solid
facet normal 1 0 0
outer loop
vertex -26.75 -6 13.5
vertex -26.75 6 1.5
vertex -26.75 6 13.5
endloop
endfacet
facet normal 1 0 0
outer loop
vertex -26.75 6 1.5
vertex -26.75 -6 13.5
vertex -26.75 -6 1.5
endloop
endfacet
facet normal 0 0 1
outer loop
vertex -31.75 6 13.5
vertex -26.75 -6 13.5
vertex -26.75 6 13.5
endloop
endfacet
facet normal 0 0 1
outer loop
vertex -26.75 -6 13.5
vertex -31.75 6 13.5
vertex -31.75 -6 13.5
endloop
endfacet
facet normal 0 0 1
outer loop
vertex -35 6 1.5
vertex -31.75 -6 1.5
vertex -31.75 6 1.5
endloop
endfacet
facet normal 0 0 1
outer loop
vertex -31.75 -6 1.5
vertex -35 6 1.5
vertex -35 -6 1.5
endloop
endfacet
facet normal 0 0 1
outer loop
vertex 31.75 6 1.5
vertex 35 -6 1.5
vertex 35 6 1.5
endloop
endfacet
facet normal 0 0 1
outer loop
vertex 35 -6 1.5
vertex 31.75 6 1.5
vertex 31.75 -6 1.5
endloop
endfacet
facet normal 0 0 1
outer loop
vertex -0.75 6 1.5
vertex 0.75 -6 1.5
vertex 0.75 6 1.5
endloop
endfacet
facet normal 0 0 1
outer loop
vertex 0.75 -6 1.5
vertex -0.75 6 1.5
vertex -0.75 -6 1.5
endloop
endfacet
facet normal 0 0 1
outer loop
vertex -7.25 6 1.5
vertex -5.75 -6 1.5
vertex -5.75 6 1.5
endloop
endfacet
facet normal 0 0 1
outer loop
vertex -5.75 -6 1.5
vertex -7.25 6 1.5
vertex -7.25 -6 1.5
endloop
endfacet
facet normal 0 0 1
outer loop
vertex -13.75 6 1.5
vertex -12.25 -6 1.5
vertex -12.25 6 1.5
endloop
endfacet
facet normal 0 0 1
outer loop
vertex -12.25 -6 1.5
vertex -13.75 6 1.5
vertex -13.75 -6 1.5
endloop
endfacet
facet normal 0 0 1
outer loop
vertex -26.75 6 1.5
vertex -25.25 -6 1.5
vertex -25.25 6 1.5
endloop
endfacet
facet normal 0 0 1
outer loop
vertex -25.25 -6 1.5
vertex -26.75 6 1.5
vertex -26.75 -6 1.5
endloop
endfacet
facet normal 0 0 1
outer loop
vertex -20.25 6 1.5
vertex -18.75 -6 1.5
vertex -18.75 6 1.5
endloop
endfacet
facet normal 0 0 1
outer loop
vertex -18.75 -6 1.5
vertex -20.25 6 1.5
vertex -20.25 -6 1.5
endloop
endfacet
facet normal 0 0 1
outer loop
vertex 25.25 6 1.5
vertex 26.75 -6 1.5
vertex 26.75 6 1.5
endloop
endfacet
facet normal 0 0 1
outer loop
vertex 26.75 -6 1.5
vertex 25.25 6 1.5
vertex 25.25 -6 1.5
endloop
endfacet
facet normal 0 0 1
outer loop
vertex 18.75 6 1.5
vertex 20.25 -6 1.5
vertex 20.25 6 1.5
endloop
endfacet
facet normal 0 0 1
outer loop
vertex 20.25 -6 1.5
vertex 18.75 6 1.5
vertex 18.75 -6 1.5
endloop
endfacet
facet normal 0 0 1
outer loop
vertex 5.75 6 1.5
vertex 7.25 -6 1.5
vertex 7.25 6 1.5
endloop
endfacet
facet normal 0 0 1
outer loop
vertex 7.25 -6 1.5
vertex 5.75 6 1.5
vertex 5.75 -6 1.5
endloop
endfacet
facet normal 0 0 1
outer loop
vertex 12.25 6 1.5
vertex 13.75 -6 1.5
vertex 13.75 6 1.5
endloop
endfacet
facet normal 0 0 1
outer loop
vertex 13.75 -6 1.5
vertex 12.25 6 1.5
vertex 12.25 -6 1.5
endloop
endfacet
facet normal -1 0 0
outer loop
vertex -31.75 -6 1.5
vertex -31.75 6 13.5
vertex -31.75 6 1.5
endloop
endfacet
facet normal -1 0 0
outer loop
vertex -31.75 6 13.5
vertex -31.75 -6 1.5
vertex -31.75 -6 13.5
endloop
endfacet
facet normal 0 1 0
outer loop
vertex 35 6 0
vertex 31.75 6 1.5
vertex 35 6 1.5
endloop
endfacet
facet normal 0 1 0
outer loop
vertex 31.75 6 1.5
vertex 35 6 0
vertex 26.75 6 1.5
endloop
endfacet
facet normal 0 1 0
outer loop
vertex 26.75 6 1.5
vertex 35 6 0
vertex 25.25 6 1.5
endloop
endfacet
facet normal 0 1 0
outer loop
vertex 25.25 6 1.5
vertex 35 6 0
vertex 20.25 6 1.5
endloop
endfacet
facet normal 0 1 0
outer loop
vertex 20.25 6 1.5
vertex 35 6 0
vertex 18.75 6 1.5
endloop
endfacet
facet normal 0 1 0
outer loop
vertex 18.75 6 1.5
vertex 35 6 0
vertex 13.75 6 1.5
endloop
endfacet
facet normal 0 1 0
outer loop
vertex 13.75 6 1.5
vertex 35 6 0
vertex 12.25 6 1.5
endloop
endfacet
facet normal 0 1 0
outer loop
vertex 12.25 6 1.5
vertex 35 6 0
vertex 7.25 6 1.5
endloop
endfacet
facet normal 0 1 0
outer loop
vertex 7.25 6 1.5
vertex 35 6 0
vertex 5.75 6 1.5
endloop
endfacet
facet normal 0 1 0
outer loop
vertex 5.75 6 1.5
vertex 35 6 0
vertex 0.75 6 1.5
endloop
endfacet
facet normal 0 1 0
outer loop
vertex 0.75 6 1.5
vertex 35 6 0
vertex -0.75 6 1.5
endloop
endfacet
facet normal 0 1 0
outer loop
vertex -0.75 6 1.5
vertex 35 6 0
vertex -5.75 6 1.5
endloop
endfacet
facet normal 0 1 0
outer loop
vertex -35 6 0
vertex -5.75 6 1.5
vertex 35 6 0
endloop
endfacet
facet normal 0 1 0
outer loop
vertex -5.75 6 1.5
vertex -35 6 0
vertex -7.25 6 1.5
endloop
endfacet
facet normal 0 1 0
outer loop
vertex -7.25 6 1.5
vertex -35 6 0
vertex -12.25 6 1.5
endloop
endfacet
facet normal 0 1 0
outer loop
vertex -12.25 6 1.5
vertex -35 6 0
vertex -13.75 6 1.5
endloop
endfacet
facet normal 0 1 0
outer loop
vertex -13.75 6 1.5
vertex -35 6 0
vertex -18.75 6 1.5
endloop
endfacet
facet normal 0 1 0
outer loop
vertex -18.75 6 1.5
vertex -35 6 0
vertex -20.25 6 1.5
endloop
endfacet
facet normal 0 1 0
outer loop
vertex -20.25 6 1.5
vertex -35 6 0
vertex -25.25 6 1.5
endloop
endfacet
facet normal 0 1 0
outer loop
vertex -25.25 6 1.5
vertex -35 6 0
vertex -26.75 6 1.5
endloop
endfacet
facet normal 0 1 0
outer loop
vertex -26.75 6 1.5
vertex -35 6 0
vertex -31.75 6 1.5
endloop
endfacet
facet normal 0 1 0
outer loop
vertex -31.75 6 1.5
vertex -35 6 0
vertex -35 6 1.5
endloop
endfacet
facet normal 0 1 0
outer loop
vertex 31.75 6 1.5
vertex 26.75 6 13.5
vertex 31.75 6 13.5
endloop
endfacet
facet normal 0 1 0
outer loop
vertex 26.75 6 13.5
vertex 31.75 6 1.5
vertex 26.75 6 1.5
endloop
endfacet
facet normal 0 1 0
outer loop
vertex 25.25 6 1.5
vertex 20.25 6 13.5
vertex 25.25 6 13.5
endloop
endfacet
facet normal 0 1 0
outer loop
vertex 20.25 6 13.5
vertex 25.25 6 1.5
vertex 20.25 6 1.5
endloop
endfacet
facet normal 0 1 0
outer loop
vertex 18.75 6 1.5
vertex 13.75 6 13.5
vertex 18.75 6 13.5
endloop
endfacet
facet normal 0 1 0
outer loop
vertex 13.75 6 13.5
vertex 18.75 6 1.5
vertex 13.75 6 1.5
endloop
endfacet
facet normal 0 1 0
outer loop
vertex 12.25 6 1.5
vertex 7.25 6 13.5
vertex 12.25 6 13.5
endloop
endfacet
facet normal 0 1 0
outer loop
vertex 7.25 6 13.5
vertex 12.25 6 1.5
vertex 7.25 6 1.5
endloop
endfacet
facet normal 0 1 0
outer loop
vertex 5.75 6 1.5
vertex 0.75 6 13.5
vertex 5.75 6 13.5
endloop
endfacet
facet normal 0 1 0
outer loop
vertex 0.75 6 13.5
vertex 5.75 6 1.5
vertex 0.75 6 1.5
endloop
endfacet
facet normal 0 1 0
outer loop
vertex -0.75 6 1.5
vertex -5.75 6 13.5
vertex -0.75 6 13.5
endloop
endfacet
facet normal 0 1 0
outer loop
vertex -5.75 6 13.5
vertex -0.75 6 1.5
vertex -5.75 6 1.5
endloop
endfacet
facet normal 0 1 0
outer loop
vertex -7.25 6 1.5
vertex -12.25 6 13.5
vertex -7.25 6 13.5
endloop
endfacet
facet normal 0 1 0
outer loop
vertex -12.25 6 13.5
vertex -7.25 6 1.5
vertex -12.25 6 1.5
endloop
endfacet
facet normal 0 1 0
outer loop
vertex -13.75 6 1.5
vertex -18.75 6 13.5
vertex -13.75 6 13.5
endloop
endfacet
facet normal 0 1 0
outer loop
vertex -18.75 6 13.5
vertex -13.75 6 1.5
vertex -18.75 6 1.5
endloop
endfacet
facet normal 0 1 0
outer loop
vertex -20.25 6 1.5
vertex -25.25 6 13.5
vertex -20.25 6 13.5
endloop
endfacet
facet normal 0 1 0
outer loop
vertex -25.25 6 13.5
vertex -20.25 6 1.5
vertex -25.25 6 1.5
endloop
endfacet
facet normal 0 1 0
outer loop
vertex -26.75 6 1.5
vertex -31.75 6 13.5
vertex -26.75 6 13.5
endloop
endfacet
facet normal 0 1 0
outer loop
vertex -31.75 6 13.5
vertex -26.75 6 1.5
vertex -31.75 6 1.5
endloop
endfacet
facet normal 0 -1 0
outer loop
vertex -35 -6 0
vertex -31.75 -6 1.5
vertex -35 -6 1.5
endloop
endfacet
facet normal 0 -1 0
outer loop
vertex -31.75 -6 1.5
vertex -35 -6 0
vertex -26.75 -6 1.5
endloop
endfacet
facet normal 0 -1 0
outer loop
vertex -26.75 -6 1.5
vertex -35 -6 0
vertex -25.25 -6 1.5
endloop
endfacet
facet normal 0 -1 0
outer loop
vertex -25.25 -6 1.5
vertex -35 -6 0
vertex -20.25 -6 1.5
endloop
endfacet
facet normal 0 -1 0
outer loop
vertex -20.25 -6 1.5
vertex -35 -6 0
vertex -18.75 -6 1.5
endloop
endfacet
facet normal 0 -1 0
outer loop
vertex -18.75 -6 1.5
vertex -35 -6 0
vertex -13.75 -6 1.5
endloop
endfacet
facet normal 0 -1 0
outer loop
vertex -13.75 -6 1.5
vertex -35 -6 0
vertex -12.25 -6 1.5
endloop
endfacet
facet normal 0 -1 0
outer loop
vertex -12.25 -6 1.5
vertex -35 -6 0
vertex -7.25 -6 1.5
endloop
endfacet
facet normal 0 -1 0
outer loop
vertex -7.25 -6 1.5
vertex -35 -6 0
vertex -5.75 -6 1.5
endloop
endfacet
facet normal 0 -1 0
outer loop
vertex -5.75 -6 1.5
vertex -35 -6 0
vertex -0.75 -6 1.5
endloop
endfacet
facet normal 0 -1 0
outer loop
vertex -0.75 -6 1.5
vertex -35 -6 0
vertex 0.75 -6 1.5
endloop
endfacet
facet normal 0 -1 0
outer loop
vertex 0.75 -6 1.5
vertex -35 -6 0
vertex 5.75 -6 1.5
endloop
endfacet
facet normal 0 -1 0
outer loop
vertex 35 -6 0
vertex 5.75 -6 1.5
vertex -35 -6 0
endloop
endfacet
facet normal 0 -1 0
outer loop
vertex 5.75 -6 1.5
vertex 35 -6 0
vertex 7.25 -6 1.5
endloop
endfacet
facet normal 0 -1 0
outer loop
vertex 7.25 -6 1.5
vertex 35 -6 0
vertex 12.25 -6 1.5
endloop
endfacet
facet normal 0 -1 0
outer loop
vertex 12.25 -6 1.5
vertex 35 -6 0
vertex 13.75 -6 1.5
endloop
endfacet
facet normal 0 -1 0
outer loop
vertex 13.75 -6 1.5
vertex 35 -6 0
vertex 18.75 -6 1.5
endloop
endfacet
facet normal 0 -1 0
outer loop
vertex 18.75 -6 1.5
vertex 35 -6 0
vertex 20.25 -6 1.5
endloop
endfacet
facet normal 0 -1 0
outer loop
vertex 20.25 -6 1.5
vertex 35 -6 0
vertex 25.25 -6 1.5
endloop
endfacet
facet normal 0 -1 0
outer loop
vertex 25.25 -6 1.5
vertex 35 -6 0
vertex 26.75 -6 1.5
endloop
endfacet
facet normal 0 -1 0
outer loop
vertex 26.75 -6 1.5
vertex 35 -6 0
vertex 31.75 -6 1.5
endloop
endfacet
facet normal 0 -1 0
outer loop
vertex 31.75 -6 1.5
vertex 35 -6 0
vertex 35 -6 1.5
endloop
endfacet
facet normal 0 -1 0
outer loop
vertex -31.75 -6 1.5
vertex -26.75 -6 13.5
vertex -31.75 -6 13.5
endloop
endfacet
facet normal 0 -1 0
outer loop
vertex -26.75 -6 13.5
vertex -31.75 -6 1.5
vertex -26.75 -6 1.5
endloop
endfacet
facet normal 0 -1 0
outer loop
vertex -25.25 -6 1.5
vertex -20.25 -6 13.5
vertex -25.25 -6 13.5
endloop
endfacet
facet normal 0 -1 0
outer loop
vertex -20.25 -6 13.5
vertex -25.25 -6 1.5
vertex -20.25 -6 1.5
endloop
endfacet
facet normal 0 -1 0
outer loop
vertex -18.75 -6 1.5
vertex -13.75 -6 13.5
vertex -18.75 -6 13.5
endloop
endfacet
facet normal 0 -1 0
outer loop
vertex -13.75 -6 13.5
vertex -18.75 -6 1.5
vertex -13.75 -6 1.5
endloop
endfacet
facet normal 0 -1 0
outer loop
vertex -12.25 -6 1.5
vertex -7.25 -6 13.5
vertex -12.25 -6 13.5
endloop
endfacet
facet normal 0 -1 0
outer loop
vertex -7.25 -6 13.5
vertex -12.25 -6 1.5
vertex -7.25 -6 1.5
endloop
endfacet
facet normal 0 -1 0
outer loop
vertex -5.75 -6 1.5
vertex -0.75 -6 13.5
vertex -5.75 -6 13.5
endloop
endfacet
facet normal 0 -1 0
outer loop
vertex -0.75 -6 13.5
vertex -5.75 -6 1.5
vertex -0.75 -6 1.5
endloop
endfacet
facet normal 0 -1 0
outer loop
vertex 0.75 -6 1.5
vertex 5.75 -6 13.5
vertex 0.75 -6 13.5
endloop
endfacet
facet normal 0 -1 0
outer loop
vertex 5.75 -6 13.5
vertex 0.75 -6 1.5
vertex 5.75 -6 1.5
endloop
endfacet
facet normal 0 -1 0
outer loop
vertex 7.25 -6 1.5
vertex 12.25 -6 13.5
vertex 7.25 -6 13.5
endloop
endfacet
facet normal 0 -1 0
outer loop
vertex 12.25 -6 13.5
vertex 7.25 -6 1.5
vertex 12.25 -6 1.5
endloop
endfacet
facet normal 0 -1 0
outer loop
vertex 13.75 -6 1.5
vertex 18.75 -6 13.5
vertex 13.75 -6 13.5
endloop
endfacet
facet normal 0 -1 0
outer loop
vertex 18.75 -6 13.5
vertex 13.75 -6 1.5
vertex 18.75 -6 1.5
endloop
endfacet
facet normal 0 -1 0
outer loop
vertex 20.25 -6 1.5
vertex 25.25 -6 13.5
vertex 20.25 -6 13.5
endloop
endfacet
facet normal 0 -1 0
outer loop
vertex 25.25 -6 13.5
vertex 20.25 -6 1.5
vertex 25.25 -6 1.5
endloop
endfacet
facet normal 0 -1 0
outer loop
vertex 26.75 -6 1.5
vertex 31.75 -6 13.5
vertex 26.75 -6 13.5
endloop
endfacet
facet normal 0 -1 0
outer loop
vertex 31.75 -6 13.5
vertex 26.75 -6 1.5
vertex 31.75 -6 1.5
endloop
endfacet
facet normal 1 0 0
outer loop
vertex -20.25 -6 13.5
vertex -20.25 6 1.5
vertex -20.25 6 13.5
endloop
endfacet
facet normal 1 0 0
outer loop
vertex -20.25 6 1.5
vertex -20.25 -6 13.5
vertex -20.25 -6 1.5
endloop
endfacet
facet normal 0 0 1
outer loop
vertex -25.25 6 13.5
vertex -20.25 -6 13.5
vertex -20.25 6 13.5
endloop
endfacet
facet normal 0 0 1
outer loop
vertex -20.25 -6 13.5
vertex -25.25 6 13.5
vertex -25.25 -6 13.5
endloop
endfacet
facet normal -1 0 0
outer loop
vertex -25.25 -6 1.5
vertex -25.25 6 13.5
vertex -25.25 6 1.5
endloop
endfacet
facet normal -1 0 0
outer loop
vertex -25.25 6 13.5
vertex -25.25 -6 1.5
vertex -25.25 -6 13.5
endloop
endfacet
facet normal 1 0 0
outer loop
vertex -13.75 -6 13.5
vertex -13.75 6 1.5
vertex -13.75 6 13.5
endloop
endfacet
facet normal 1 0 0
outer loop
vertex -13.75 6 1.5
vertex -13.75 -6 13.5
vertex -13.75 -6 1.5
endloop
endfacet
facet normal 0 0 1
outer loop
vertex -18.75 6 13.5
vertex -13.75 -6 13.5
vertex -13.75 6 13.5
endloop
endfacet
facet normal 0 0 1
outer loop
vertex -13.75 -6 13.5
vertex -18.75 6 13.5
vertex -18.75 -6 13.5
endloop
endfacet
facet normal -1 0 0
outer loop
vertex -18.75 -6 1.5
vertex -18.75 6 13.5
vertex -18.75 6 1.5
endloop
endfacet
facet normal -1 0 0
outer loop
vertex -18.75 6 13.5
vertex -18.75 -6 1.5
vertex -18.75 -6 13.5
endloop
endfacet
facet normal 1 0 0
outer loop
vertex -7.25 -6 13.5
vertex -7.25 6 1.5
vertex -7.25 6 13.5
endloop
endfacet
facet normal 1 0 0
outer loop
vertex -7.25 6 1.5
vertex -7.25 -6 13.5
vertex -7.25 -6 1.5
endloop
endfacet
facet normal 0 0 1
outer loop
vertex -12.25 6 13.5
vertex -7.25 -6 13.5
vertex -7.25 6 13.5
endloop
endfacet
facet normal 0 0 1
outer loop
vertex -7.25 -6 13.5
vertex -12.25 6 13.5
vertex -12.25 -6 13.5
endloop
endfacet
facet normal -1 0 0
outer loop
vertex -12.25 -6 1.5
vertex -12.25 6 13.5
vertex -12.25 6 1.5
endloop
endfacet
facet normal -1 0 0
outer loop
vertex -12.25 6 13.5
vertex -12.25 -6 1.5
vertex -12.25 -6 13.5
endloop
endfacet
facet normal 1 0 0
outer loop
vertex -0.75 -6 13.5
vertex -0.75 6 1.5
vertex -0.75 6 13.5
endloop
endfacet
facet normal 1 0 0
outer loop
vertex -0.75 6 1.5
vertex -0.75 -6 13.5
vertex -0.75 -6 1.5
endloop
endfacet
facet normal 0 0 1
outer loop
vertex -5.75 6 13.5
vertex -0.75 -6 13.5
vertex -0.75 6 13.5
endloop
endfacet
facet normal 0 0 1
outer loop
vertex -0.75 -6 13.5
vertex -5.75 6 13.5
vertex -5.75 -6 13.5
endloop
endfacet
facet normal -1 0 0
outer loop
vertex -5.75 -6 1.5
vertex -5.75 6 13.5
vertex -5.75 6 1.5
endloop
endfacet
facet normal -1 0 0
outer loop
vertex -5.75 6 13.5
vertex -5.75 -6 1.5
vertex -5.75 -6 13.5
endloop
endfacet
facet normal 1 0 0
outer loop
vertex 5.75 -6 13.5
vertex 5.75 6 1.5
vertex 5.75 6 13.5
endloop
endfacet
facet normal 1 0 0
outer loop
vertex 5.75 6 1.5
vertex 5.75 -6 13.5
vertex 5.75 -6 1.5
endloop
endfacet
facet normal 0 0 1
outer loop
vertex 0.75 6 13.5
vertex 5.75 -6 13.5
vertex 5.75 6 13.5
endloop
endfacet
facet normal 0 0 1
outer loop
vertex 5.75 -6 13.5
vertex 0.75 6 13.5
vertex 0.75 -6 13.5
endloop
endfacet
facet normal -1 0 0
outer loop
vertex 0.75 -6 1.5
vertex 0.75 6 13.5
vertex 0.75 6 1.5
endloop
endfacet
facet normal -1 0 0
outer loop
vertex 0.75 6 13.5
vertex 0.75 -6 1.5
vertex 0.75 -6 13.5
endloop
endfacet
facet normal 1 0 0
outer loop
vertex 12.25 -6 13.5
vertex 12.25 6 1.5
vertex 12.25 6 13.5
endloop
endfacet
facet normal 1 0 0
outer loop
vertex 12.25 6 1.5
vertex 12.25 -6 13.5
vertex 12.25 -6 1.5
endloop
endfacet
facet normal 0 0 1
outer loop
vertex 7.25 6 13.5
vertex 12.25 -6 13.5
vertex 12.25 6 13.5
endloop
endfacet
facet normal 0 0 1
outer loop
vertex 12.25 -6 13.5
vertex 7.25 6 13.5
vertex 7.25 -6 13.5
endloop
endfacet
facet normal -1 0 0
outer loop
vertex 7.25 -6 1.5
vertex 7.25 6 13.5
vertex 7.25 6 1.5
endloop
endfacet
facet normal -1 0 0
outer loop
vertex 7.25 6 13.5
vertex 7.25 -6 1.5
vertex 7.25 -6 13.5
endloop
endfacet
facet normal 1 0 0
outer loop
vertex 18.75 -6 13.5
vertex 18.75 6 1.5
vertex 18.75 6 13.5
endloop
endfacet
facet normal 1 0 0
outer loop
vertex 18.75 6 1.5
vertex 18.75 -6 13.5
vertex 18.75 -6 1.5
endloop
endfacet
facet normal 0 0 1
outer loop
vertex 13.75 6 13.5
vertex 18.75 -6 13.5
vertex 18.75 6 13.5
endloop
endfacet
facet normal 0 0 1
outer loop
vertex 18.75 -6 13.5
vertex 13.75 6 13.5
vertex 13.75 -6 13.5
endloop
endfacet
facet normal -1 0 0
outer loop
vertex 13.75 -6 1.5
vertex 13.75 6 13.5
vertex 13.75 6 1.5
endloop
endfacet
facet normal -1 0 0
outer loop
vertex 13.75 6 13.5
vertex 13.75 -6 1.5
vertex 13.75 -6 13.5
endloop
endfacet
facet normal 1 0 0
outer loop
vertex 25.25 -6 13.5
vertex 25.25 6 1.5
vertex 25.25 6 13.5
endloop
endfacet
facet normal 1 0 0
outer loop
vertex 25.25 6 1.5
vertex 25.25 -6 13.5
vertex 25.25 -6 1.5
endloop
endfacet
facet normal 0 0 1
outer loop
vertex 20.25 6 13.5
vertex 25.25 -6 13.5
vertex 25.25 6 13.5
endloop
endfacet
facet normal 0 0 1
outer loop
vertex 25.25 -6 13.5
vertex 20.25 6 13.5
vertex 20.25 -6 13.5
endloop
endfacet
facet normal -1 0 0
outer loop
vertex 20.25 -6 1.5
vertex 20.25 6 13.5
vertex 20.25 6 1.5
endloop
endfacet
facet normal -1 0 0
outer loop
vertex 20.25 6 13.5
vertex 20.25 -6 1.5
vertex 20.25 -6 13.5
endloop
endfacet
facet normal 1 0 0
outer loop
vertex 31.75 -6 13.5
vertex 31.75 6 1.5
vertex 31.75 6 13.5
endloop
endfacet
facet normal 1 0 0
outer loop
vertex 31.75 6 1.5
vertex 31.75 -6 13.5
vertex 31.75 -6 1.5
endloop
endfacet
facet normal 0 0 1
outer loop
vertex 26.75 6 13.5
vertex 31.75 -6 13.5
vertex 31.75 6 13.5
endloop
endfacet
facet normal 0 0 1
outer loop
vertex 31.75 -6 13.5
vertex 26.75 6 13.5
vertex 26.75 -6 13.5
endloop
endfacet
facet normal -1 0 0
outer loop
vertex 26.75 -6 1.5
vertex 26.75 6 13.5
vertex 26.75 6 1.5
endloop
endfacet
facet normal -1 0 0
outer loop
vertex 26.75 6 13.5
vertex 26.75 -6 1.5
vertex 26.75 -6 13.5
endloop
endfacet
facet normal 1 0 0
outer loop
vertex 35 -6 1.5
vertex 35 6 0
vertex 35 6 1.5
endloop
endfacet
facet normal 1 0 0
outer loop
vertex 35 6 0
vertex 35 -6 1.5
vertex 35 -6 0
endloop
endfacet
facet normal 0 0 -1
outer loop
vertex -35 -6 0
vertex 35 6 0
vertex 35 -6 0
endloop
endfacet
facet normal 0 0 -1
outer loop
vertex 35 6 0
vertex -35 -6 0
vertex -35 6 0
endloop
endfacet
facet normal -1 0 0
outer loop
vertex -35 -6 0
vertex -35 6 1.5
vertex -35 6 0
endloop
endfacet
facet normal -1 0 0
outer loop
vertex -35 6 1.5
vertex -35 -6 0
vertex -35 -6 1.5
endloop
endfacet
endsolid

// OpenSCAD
// 10-well comb for casting agarose gels
// Print orientation: flat on bed, teeth pointing down (-Z)

// ---------- Parameters ----------
plate_t      = 1.5;   // plate thickness (Z)
spine_len    = 70;    // spine length (X)
spine_w      = 12;    // spine width (Y)
tooth_count  = 10;    // number of teeth
tooth_w      = 5.0;   // tooth width (X)
tooth_len    = 12;    // tooth length (Y)
tooth_h      = 12;    // tooth height from plate top (Z)
gap          = 1.5;   // gap between teeth (X)
eps          = 0.5;   // cutter overshoot past faces

$fn = 64;

// ---------- Derived ----------
pitch   = tooth_w + gap;
x0      = -(tooth_count - 1) * pitch / 2;   // first tooth centre (row centred on spine)
reach   = max(eps, tooth_h);                // cutter must pass through the top face

// ---------- Model ----------
union() {
    // Plate with spine
    translate([-spine_len / 2, -spine_w / 2, 0])
        cube([spine_len, spine_w, plate_t]);

    // Teeth hanging from the +Y edge of the spine
    for (i = [0 : tooth_count - 1])
        translate([x0 + i * pitch - tooth_w / 2,
                   spine_w / 2 - tooth_len,
                   plate_t])
            cube([tooth_w, tooth_len, reach]);
}
